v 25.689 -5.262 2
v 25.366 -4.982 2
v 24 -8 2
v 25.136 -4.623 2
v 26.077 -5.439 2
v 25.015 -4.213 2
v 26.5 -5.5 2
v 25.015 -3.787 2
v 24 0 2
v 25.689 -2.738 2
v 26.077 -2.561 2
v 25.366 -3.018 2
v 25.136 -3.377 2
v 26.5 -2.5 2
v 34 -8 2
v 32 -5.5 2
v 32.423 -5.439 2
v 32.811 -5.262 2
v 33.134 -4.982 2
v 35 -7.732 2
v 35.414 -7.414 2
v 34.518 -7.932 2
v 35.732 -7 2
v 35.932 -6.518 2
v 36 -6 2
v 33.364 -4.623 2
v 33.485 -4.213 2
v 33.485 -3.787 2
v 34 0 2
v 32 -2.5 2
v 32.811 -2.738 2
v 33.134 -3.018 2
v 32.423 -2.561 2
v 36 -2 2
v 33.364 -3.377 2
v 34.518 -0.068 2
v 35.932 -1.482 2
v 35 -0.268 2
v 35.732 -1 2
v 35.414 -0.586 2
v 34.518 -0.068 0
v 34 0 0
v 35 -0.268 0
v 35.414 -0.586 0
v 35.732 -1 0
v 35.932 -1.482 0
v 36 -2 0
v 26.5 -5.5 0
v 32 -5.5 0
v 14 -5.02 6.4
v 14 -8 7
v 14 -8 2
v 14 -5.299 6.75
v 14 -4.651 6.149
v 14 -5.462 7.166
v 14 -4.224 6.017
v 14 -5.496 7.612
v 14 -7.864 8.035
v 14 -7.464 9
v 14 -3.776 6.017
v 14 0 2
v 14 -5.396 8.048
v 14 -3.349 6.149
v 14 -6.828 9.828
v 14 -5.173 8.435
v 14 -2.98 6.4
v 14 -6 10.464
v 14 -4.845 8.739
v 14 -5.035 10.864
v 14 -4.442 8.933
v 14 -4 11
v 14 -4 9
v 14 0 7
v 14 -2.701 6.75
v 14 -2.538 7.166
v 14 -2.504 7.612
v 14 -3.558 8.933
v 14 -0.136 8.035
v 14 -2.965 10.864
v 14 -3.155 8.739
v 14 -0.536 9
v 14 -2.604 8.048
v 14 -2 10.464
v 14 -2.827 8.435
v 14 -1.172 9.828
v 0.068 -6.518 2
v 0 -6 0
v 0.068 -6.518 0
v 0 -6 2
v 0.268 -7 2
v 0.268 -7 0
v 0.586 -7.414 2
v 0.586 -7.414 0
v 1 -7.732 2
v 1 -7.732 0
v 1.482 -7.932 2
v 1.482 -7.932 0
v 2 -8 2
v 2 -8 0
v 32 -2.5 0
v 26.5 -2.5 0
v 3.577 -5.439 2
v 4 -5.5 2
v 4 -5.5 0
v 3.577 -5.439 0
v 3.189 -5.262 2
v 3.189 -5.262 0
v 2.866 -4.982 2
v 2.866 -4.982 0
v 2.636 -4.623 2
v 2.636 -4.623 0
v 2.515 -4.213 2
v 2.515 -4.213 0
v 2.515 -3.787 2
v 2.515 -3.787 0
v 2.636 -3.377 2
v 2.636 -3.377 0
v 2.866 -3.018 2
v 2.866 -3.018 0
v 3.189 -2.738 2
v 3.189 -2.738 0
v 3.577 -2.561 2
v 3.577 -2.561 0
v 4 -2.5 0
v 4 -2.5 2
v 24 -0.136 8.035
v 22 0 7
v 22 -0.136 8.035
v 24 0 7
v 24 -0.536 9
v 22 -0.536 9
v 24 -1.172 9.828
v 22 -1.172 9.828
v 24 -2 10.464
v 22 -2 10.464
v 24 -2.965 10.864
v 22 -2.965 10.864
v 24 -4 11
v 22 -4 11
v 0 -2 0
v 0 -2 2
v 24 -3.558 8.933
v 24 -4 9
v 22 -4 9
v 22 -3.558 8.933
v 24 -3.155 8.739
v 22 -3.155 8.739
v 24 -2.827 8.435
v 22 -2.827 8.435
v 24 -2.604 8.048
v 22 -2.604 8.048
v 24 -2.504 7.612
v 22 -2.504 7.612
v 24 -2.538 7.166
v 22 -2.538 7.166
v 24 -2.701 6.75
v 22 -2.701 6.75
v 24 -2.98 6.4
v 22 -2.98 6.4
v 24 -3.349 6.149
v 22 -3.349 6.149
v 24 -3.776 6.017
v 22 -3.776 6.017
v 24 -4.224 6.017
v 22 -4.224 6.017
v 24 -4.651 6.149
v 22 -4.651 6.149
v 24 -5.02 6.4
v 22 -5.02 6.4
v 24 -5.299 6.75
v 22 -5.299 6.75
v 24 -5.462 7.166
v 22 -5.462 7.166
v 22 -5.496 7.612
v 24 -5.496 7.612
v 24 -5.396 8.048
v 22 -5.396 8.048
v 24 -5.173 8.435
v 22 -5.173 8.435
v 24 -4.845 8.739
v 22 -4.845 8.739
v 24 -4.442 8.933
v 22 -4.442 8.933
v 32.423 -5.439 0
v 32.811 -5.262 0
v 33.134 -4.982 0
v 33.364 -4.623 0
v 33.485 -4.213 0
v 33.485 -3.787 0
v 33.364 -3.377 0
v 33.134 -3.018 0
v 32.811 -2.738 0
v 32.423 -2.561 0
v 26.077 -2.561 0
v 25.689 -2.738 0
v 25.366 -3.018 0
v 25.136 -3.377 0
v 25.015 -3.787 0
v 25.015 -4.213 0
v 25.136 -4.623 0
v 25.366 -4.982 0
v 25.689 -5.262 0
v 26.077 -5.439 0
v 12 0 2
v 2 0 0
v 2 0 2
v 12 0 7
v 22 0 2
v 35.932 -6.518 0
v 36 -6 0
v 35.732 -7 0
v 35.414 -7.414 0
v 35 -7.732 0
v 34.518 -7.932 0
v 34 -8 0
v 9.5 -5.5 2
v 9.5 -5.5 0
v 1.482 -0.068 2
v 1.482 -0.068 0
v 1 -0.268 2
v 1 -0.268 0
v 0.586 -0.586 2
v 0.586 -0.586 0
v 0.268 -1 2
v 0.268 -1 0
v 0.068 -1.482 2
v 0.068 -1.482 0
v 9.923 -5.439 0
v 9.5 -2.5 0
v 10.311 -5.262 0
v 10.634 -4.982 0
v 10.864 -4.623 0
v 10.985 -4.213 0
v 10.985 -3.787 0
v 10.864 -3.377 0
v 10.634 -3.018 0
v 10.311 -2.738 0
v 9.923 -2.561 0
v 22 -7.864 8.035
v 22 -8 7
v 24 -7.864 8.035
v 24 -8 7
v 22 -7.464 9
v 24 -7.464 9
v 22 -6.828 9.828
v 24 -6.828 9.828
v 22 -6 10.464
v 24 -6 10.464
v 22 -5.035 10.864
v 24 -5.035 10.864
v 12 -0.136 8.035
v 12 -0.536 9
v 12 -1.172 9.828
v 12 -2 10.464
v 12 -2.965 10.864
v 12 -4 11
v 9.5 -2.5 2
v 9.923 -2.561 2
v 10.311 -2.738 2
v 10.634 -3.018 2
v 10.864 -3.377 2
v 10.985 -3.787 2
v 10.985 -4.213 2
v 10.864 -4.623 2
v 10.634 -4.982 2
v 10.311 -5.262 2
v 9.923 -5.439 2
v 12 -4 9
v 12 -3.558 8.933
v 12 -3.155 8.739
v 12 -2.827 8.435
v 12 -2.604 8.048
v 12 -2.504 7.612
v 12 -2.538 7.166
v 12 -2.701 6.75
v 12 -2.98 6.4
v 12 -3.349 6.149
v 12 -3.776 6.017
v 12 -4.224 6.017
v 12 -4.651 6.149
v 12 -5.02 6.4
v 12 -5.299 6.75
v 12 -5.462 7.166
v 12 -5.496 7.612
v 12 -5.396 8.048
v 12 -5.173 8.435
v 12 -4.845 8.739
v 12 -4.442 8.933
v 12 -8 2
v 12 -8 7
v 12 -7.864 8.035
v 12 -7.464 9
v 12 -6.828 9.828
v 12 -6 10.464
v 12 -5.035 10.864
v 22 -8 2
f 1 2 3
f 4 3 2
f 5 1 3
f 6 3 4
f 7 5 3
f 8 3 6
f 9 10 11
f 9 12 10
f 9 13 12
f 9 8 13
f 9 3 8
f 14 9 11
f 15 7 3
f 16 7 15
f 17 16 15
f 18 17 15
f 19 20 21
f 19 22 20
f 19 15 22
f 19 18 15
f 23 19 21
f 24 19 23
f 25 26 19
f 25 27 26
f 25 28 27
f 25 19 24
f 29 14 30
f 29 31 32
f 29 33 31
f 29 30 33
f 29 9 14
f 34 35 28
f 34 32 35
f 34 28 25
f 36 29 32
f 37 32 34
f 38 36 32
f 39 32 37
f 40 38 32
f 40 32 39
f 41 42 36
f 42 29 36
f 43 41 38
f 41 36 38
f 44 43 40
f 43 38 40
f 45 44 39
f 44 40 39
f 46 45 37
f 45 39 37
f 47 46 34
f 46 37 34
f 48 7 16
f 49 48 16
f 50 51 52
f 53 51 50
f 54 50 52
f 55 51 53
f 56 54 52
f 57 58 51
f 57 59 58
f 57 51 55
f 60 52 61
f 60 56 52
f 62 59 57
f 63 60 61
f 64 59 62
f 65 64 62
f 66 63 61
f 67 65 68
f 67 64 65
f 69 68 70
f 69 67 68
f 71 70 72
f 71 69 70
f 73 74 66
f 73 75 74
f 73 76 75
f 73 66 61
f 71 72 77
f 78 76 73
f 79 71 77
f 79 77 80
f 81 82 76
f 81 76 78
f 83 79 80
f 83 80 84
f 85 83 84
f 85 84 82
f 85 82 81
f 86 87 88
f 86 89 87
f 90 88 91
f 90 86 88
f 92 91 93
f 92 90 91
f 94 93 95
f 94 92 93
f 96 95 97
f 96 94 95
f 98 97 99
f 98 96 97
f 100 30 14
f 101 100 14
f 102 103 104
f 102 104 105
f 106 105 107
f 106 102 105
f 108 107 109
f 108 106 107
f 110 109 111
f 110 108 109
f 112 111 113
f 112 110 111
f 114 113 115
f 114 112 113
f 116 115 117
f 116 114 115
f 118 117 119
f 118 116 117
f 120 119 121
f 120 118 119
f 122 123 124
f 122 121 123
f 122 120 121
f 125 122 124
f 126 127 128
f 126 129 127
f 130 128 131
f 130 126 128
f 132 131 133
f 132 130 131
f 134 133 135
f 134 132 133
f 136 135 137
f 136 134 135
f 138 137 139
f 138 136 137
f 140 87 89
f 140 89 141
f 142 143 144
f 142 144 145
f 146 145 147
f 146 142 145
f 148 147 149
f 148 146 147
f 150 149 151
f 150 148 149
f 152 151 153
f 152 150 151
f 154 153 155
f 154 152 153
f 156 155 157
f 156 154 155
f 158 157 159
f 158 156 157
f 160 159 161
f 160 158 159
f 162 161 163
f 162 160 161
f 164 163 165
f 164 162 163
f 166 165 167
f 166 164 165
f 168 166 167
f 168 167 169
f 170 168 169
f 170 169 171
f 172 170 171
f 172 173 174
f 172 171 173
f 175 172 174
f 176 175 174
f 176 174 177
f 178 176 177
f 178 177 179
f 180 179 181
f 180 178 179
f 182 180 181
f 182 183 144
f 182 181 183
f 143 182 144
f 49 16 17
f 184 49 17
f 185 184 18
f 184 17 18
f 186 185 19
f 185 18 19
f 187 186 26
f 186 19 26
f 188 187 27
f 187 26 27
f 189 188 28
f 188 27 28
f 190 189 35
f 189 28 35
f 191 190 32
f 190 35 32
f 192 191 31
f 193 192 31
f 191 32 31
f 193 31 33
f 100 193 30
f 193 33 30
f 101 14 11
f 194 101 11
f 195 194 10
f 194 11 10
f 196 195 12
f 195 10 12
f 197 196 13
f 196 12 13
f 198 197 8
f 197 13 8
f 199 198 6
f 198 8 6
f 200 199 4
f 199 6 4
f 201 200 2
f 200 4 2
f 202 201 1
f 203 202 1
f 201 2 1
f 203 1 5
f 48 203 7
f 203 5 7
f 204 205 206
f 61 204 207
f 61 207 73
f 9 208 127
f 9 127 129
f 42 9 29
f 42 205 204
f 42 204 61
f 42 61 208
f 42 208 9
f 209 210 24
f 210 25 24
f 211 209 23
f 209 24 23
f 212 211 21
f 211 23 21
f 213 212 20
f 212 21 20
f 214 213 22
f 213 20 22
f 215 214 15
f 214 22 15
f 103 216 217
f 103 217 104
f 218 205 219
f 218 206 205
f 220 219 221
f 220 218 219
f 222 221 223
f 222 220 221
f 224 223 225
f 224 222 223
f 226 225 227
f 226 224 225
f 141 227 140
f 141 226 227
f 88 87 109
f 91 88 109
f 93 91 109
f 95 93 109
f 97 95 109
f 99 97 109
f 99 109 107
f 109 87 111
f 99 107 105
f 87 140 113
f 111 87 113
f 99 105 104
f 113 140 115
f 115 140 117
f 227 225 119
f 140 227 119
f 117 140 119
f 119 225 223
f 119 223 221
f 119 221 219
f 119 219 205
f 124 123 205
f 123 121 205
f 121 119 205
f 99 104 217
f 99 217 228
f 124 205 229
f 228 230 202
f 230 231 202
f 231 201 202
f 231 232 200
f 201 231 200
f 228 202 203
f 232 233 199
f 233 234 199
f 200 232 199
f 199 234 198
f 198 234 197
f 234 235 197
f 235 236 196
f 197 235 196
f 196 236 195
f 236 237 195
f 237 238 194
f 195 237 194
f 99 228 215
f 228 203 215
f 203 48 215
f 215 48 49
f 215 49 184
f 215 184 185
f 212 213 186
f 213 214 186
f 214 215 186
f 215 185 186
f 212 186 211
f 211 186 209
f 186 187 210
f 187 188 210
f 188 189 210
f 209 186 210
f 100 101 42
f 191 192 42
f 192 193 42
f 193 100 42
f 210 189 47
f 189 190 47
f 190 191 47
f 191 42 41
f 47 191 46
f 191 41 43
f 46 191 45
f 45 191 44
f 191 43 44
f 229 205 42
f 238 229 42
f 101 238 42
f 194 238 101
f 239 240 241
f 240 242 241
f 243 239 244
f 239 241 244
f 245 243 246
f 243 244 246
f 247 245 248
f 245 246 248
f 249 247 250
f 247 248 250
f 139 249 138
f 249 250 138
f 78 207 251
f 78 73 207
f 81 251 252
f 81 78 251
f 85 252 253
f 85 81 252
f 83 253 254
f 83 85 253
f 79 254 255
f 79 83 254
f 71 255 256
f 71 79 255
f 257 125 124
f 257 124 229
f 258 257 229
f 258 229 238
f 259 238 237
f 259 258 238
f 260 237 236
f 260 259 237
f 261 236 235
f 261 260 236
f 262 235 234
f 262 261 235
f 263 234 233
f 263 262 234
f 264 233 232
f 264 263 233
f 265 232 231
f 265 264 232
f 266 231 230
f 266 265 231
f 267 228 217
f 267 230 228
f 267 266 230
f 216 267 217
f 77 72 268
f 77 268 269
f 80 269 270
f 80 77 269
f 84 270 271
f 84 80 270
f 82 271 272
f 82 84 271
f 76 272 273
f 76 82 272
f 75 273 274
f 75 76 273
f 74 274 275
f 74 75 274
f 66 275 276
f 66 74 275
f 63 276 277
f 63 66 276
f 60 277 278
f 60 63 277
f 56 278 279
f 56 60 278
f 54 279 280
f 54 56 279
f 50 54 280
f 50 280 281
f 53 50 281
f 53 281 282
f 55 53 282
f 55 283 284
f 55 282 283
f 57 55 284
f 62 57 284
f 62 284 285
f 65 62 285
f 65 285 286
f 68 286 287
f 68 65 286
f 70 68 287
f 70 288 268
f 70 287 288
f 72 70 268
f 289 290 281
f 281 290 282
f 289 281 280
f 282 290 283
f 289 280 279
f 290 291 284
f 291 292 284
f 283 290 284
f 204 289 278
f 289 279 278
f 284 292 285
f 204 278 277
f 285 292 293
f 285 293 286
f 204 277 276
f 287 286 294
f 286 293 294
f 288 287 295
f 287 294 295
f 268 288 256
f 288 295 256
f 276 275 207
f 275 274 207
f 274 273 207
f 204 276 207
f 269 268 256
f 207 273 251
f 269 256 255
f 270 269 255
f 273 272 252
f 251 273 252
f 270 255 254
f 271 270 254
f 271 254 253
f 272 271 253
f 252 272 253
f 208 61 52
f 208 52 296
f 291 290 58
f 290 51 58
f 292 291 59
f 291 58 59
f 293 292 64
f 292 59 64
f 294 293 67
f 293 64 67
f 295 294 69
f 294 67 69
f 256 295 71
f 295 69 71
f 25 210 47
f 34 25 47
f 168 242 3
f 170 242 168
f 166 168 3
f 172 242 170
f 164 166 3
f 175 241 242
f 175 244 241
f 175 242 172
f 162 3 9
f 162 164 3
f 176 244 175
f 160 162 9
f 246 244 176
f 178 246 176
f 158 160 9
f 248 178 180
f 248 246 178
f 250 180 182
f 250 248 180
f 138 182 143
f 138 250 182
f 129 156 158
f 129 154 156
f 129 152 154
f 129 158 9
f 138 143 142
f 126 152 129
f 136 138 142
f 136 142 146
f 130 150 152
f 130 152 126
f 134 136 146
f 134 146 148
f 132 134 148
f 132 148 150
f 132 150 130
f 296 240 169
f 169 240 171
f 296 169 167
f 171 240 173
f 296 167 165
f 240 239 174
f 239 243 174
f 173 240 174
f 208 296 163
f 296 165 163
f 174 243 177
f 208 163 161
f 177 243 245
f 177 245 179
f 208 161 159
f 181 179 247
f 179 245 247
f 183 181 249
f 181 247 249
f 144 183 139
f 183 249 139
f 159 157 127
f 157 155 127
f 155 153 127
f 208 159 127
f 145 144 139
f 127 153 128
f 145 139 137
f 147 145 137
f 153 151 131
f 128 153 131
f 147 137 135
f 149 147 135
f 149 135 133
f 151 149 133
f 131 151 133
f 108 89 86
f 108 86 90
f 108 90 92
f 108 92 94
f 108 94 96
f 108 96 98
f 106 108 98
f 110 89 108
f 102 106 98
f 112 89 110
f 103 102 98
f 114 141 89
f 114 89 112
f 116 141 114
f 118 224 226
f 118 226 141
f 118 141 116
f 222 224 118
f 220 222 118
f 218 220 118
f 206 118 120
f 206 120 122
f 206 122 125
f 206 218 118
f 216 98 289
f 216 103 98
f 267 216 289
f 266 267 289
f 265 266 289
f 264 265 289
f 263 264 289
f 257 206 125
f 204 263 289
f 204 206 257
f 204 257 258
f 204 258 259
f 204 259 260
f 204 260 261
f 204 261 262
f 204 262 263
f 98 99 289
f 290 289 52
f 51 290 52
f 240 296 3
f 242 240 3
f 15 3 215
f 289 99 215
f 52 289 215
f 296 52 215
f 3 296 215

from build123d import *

# Parameters (mm, degrees)
SKETCH_1_W               = 36
SKETCH_1_H               = 8
EXTRUDE_1_DEPTH          = 11
SKETCH_2_W               = 8
SKETCH_2_H               = 8
SKETCH_2_W_2             = 12
CUT_EXTRUDE_1_DEPTH      = 9
FILLET_1_R               = 4
CUT_EXTRUDE_2_DEPTH      = 28.586228448
CUT_EXTRUDE_2_DEPTH_BACK = 28.586228448
SKETCH_3_R               = 1.5
FILLET_2_R               = 2
CUT_EXTRUDE_3_DEPTH      = 9


with BuildPart() as part:
    # 草图1 → 凸台-拉伸1 (new body)
    with BuildSketch(Plane.XY):
        with Locations((18, -4)):
            Rectangle(SKETCH_1_W, SKETCH_1_H)
    extrude(amount=EXTRUDE_1_DEPTH)

    # 草图2 → 切除-拉伸1 (cut)
    with BuildSketch(Plane.XY.offset(11)):
        with Locations((18, -4)):
            Rectangle(SKETCH_2_W, SKETCH_2_H)
        with Locations((6, -4)):
            Rectangle(SKETCH_2_W_2, SKETCH_2_H)
        with Locations((30, -4)):
            Rectangle(SKETCH_2_W_2, SKETCH_2_H)
    extrude(amount=-CUT_EXTRUDE_1_DEPTH, mode=Mode.SUBTRACT)

    # 圆角1
    fillet_1_edges = [part.edges().sort_by_distance(p)[0] for p in [
        (23, -8, 11),
        (23, 0, 11),
        (13, 0, 11),
        (13, -8, 11),
    ]]
    fillet(fillet_1_edges, radius=FILLET_1_R - 0.0001)  # a hair under: the kernel refuses the full size

    # 草图3 → 切除-拉伸2 (cut, two sides: drawn at the far end of the back side and taken through both)
    with BuildSketch(Plane.ZY.offset(-12).offset(-CUT_EXTRUDE_2_DEPTH_BACK)):
        with Locations((7.5, -4)):
            Circle(SKETCH_3_R)
    extrude(amount=CUT_EXTRUDE_2_DEPTH + CUT_EXTRUDE_2_DEPTH_BACK, mode=Mode.SUBTRACT)

    # 圆角2
    fillet_2_edges = [part.edges().sort_by_distance(p)[0] for p in [
        (0, -8, 1),
        (0, 0, 1),
        (36, 0, 1),
        (36, -8, 1),
    ]]
    fillet(fillet_2_edges, radius=FILLET_2_R)

    # 草图4 → 切除-拉伸3 (cut)
    with BuildSketch(Plane.XY.offset(2)):
        with BuildLine():
            Line((32, -2.5), (26.5, -2.5))
            ThreePointArc((26.5, -2.5), (25, -4), (26.5, -5.5))
            Line((26.5, -5.5), (32, -5.5))
            ThreePointArc((32, -5.5), (33.5, -4), (32, -2.5))
        make_face()
        with BuildLine():
            Line((4, -2.5), (9.5, -2.5))
            ThreePointArc((9.5, -2.5), (11, -4), (9.5, -5.5))
            Line((9.5, -5.5), (4, -5.5))
            ThreePointArc((4, -5.5), (2.5, -4), (4, -2.5))
        make_face()
    extrude(amount=-CUT_EXTRUDE_3_DEPTH, mode=Mode.SUBTRACT)


solid = part.part
